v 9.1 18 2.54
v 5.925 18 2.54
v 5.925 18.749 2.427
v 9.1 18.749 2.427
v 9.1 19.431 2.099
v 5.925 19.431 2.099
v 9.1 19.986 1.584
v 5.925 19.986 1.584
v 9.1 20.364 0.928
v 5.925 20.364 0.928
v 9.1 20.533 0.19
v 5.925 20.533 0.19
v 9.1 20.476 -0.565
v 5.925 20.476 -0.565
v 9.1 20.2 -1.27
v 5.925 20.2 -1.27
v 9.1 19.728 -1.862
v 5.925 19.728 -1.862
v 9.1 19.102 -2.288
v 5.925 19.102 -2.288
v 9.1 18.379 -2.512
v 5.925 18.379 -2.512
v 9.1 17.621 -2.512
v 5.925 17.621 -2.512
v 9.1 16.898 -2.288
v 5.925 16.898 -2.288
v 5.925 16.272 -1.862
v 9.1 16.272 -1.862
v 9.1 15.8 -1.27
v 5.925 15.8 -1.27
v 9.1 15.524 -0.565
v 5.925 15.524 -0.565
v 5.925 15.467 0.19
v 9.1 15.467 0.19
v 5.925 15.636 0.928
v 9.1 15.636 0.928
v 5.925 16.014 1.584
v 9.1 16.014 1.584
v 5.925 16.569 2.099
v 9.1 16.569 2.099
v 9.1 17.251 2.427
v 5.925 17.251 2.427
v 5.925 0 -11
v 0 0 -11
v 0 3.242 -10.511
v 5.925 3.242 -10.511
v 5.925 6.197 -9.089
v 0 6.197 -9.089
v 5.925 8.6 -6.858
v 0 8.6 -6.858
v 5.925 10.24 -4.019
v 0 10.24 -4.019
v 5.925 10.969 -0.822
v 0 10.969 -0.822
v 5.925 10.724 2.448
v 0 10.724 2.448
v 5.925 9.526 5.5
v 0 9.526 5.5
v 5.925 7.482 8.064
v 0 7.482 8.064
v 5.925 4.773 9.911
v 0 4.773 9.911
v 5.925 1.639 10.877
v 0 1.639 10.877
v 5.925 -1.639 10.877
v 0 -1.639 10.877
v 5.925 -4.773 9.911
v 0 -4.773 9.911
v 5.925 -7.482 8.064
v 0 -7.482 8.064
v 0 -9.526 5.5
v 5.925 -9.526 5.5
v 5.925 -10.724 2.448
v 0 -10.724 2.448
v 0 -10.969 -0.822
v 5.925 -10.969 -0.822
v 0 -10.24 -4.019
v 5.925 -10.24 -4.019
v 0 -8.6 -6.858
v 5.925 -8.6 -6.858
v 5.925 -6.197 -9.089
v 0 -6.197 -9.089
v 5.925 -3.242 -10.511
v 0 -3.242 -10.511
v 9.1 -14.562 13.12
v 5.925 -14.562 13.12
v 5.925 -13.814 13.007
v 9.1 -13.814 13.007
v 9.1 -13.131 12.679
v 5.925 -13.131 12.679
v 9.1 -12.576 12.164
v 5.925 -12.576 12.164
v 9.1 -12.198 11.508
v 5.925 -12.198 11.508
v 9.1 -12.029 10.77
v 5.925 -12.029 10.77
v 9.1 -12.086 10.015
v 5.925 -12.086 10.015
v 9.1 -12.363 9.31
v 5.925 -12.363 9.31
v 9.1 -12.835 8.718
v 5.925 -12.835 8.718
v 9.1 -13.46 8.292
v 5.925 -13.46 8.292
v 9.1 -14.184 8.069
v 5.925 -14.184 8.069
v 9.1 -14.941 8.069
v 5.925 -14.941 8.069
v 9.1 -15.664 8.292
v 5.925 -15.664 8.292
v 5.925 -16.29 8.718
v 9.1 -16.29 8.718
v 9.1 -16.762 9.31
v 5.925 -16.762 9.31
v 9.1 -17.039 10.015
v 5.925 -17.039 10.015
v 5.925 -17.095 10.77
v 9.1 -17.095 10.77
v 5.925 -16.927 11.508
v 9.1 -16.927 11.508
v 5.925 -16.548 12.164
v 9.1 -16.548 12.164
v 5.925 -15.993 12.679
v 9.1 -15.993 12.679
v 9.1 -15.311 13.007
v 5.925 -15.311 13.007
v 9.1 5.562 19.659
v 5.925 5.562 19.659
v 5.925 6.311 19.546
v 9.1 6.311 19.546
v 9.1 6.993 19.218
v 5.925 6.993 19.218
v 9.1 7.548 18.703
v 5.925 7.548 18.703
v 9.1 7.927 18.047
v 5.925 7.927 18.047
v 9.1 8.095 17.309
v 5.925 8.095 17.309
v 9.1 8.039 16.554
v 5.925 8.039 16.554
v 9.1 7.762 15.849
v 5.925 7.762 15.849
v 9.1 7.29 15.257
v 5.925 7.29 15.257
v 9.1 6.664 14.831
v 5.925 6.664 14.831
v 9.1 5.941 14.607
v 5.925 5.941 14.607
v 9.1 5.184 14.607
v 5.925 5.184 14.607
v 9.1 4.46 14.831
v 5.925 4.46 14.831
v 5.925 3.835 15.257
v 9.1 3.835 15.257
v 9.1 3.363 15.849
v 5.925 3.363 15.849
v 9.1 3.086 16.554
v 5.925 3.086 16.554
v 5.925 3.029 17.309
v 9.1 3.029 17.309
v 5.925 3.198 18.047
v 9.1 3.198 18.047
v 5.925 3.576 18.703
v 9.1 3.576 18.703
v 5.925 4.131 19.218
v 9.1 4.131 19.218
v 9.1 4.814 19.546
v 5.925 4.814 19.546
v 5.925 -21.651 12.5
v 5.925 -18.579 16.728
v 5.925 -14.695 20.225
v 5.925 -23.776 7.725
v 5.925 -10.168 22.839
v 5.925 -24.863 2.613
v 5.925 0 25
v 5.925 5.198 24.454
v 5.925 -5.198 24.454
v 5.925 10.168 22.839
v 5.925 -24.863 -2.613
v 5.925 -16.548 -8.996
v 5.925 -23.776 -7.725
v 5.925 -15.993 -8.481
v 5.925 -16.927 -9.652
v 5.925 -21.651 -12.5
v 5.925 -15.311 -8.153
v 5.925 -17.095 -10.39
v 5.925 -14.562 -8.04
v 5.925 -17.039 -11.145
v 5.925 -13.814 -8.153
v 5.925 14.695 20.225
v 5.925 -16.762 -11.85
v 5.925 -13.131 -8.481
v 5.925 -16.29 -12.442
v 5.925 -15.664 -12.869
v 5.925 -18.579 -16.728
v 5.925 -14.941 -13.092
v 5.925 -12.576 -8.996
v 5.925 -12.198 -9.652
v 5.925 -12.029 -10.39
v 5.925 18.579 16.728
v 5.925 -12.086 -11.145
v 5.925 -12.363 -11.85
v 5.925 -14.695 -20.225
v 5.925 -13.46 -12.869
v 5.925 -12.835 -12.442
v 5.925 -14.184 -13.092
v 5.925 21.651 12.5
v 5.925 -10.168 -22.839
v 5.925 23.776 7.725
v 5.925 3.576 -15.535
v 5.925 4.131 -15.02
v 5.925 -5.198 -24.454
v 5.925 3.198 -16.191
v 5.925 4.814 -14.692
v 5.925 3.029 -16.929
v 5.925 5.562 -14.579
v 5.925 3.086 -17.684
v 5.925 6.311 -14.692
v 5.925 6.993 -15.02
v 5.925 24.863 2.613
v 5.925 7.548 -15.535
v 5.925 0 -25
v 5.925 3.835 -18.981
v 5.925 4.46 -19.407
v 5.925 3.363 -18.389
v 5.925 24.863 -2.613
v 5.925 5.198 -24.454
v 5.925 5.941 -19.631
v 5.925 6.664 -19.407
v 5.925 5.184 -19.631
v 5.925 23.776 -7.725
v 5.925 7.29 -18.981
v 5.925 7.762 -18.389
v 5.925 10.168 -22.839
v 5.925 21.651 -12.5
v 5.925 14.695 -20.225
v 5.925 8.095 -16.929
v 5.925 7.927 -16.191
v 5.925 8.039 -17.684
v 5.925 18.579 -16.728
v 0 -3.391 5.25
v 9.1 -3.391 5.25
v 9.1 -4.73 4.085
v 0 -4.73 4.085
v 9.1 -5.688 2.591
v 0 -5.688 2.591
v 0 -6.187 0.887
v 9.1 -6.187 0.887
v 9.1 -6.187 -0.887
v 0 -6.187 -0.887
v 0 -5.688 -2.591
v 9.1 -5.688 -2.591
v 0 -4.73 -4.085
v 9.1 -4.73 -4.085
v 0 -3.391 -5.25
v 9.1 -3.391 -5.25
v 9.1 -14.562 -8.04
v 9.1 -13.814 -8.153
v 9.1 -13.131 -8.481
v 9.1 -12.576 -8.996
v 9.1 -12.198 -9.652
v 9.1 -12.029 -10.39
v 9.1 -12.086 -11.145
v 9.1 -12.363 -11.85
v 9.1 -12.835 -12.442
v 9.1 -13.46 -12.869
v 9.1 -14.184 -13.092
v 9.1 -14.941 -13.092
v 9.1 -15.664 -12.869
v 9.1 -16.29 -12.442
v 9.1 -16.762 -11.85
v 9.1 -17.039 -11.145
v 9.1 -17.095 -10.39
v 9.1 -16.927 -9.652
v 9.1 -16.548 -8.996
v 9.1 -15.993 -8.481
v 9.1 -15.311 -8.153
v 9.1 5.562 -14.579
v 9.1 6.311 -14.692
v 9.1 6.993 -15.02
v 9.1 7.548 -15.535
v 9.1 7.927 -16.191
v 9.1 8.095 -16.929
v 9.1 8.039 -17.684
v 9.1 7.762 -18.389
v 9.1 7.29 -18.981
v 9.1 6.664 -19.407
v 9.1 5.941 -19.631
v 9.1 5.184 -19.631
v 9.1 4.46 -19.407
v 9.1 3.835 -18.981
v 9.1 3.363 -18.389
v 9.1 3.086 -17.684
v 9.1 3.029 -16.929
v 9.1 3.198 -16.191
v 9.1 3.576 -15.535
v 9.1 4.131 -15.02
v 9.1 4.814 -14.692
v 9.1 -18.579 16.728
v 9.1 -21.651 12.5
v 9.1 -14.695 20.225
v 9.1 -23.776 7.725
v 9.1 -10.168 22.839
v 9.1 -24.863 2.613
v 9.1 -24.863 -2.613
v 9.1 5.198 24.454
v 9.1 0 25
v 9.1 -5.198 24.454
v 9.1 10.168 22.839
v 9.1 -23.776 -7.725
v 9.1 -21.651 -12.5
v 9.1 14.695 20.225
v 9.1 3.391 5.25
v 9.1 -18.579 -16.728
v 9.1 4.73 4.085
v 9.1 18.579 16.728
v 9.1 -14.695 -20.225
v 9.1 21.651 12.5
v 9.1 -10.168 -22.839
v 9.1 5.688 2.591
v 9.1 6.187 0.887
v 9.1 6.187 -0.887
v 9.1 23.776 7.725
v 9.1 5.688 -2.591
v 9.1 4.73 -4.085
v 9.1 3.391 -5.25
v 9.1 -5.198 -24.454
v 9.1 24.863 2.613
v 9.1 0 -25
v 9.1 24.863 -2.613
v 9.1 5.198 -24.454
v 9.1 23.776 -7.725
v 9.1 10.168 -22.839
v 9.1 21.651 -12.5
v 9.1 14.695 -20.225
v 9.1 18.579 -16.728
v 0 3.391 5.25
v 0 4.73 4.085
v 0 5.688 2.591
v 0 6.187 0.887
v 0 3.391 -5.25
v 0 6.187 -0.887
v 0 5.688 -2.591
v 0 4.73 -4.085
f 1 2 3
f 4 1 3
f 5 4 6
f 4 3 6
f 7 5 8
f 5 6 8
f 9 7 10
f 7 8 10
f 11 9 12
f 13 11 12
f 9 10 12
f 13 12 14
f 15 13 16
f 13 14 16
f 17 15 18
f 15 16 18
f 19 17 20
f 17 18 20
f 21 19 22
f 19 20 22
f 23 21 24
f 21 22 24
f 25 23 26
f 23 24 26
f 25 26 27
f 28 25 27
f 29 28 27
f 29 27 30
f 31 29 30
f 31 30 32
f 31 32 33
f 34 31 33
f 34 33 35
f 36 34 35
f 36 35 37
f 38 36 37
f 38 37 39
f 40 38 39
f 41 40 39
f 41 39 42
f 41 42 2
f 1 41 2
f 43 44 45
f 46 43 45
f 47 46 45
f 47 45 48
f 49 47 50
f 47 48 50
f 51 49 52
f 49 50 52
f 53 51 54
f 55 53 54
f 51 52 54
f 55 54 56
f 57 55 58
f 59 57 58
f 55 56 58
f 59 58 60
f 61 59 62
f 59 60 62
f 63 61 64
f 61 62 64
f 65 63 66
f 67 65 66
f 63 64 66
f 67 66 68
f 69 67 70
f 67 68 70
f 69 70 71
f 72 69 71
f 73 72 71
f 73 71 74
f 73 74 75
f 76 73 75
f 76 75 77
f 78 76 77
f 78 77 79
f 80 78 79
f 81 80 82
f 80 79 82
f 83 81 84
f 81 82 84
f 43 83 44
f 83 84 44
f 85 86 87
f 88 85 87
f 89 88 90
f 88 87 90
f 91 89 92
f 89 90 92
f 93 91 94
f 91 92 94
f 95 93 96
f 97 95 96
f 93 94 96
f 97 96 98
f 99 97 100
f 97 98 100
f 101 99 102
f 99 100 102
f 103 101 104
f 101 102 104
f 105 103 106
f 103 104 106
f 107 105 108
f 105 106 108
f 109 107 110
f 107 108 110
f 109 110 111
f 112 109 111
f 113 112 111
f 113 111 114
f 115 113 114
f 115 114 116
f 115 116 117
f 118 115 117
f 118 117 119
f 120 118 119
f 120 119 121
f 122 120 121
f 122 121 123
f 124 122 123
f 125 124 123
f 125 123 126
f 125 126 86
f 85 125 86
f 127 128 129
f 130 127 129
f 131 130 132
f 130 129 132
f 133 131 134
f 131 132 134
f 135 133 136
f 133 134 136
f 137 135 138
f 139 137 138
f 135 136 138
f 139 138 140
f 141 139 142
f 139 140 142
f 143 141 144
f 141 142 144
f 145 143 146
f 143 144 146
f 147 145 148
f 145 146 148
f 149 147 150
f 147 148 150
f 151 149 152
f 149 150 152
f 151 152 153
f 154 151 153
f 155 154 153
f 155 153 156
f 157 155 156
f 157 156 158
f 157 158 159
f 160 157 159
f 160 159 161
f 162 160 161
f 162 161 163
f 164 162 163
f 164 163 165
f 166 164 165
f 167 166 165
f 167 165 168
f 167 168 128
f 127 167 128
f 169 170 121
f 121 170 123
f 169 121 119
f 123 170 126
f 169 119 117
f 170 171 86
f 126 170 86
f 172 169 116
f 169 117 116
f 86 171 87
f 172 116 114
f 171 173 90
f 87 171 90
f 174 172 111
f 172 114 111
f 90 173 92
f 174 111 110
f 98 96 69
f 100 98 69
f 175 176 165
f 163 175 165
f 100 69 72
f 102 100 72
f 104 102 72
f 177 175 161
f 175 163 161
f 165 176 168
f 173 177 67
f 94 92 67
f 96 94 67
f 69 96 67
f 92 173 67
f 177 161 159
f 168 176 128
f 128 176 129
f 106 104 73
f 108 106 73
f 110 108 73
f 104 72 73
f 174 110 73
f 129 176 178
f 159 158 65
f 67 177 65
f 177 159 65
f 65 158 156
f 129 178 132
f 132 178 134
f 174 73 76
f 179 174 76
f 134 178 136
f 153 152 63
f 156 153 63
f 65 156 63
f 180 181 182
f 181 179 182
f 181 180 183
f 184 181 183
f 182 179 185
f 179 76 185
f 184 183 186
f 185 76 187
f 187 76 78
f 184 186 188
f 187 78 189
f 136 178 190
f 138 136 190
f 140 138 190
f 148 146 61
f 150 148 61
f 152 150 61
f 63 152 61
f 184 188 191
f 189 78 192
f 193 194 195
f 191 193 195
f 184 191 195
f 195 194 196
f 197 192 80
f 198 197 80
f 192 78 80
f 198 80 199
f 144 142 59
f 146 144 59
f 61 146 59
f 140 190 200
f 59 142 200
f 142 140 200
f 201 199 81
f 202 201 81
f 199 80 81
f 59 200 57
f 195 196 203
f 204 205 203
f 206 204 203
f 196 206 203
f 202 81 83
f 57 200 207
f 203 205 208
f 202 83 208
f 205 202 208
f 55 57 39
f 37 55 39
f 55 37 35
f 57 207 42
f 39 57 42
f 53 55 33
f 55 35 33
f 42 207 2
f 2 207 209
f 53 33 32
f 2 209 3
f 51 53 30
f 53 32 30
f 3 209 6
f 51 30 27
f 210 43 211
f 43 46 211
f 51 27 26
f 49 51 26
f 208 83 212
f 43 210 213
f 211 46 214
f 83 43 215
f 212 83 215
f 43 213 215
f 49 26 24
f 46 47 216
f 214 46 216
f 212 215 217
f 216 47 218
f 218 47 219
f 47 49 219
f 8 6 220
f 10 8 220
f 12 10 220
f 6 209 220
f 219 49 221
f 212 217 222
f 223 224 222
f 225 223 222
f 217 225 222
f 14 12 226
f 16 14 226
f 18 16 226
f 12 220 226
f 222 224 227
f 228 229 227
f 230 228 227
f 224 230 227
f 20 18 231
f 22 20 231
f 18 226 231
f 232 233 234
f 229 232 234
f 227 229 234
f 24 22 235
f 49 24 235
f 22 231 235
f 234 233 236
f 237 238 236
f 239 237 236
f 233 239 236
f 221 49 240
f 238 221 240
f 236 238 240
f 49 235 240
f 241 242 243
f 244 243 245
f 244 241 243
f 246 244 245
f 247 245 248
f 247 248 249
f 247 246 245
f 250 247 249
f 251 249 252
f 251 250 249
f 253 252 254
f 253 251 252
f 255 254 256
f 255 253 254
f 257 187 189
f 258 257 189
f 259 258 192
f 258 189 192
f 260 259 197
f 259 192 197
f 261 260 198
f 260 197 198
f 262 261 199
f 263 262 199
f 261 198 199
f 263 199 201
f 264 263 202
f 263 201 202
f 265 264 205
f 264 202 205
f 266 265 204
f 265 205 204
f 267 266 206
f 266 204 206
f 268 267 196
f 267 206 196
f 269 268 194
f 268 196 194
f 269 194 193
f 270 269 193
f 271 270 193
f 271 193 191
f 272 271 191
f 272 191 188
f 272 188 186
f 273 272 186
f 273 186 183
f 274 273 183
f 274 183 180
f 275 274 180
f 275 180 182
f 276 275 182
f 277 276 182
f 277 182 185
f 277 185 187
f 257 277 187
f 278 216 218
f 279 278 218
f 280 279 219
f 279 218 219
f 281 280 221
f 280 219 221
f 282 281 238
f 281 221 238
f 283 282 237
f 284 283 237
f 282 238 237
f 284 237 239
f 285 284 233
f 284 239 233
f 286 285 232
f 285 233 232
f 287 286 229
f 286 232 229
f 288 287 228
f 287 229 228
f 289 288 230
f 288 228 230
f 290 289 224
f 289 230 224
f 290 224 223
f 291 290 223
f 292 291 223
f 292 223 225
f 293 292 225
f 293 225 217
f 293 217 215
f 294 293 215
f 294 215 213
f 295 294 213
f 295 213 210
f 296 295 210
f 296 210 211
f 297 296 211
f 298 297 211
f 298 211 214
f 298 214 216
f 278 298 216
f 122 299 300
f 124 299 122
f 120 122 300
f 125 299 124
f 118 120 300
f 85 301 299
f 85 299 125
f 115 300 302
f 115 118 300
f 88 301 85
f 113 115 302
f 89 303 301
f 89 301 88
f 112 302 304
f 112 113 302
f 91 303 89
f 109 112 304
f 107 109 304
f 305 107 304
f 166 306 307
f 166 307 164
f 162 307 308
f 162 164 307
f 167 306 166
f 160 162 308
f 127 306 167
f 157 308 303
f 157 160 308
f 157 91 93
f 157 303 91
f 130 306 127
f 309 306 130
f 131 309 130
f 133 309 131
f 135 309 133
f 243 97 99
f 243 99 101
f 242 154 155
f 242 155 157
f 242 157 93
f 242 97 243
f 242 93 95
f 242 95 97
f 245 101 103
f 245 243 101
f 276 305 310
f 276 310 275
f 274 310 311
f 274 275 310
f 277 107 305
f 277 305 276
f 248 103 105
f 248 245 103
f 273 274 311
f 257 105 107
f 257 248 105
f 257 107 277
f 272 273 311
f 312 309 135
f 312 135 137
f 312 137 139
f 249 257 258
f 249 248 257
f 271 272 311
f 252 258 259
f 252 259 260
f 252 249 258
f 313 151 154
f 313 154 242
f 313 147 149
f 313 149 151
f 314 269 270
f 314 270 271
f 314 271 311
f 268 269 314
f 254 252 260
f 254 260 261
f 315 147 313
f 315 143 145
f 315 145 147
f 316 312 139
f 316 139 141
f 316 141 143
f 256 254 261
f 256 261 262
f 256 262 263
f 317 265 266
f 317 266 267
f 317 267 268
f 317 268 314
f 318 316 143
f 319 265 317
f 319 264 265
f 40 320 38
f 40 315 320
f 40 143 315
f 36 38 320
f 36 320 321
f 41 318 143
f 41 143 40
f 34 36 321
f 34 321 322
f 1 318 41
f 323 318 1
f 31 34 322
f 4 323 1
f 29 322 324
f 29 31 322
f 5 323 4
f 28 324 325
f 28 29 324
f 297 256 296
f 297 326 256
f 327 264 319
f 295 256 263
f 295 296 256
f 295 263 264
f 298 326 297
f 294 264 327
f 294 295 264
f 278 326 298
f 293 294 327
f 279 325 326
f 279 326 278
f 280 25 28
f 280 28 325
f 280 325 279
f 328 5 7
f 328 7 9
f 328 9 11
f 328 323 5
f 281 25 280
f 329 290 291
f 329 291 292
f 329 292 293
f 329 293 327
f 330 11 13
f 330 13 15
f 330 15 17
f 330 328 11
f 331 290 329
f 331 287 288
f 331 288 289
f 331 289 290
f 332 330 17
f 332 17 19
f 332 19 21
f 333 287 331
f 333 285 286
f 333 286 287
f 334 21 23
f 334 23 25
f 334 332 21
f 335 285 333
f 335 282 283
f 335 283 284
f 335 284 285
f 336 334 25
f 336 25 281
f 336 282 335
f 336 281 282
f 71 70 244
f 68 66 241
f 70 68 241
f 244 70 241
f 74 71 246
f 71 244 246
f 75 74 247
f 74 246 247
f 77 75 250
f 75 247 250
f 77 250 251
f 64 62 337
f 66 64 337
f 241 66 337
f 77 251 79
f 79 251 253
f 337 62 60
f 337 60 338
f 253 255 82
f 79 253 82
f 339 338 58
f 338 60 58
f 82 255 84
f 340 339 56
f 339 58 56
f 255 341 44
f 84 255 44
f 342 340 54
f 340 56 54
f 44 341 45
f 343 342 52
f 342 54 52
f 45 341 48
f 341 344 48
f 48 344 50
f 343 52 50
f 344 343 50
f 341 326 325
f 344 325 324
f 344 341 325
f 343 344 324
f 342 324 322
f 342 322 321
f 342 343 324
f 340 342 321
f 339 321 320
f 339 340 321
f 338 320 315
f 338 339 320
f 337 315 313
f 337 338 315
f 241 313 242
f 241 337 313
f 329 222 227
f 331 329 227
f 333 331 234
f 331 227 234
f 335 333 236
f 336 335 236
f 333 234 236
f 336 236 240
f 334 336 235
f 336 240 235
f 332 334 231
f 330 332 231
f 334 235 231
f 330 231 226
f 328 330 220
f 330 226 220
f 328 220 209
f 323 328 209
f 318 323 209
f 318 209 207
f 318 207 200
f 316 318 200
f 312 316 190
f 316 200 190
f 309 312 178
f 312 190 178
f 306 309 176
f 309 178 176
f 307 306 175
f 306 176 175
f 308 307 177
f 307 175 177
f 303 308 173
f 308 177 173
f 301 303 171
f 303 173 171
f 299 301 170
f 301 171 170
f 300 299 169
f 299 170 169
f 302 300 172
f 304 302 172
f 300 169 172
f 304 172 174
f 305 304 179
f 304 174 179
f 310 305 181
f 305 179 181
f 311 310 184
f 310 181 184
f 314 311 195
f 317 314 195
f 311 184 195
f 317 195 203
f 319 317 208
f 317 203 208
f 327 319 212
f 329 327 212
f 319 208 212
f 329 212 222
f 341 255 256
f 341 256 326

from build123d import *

# Parameters (mm, degrees)
SKETCH1_R           = 11
BOSS_EXTRUDE1_DEPTH = 5.925
SKETCH2_R           = 25
BOSS_EXTRUDE2_DEPTH = 3.175
SKETCH3_R           = 2.54
CUT_EXTRUDE1_DEPTH  = 36.848369907


with BuildPart() as part:
    # Sketch1 → Boss-Extrude1 (new body)
    with BuildSketch(Plane(origin=(0, 0, 0), x_dir=(0, 0, -1), z_dir=(1, 0, 0))):
        Circle(SKETCH1_R)
        with BuildLine():
            Line((-5.25, 3.391164992), (-5.25, -3.391164992))
            ThreePointArc((-5.25, -3.391164992), (0, -6.25), (5.25, -3.391164992))
            Line((5.25, -3.391164992), (5.25, 3.391164992))
            ThreePointArc((5.25, 3.391164992), (0, 6.25), (-5.25, 3.391164992))
        make_face(mode=Mode.SUBTRACT)
    extrude(amount=BOSS_EXTRUDE1_DEPTH)

    # Sketch2 → Boss-Extrude2 (add)
    with BuildSketch(Plane(origin=(5.925, 0, 0), x_dir=(0, 0, -1), z_dir=(1, 0, 0))):
        Circle(SKETCH2_R)
        with BuildLine():
            Line((-5.25, 3.391164992), (-5.25, -3.391164992))
            ThreePointArc((-5.25, -3.391164992), (0, -6.25), (5.25, -3.391164992))
            Line((5.25, -3.391164992), (5.25, 3.391164992))
            ThreePointArc((5.25, 3.391164992), (0, 6.25), (-5.25, 3.391164992))
        make_face(mode=Mode.SUBTRACT)
    extrude(amount=BOSS_EXTRUDE2_DEPTH)

    # Sketch3 → Cut-Extrude1 (cut, through all)
    with BuildSketch(Plane.ZY.offset(-5.925)):
        with Locations((0, 18)):
            Circle(SKETCH3_R)
        with Locations((17.119017293, 5.562305899)):
            Circle(SKETCH3_R)
        with Locations((10.580134541, -14.562305899)):
            Circle(SKETCH3_R)
        with Locations((-10.580134541, -14.562305899)):
            Circle(SKETCH3_R)
        with Locations((-17.119017293, 5.562305899)):
            Circle(SKETCH3_R)
    extrude(amount=-CUT_EXTRUDE1_DEPTH, mode=Mode.SUBTRACT)


solid = part.part
